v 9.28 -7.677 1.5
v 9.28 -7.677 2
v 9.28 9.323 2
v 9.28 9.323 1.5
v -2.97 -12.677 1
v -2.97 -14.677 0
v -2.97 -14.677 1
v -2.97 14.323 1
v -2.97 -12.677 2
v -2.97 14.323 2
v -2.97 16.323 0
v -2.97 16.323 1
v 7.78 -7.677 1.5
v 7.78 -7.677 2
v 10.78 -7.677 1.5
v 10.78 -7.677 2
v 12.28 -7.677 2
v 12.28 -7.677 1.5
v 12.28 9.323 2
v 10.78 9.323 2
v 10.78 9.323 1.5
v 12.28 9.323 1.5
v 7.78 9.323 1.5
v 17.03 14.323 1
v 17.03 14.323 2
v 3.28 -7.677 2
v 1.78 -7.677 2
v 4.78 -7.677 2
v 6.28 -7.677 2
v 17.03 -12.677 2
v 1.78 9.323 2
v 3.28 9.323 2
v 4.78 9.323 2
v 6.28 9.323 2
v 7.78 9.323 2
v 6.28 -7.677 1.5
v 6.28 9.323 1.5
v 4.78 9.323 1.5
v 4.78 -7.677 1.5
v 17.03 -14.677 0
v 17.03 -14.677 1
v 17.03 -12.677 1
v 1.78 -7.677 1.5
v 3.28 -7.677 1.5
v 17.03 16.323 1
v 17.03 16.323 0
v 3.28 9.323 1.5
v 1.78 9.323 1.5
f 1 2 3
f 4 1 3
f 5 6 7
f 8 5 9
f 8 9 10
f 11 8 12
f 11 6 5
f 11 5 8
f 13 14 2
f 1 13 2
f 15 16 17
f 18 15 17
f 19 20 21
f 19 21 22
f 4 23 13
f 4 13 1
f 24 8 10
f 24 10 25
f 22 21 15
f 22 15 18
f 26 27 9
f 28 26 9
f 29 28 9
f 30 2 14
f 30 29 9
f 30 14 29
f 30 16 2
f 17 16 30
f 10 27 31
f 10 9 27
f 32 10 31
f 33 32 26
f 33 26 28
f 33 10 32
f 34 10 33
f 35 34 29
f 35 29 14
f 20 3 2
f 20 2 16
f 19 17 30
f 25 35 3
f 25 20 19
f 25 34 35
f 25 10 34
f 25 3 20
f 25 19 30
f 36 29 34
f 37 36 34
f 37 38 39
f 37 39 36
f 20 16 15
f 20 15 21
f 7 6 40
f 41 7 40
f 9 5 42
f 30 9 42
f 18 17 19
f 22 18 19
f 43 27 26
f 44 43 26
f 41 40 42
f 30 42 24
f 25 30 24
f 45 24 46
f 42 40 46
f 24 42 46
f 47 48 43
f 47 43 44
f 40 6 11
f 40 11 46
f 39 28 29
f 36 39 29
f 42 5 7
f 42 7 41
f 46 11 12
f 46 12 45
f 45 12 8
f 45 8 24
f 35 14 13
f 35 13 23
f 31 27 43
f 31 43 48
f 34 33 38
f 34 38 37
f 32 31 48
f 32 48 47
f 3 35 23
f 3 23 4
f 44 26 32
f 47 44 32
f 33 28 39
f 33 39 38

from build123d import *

# Parameters (mm, degrees)
F0_W     = 20
F0_H     = 31
F1_DEPTH = 1
F2_W     = 20
F2_H     = 27
F3_DEPTH = 1
F4_W     = 1.5
F4_H     = 17
F5_DEPTH = 0.5


with BuildPart() as f1:
    # F0 (on Top) → F1 (new body)
    with BuildSketch(Plane.XY):
        with Locations((7.02957, 0.822581)):
            Rectangle(F0_W, F0_H)
    extrude(amount=F1_DEPTH)

    # F2 (on face) → F3 (join)
    with BuildSketch(Plane.XY.offset(1)):
        with Locations((7.02957, 0.822581)):
            Rectangle(F2_W, F2_H)
    extrude(amount=F3_DEPTH)

    # F4 (on face) → F5 (cut)
    with BuildSketch(Plane.XY.offset(2)):
        with Locations((2.52957, 0.822581)):
            Rectangle(F4_W, F4_H)
        with Locations((5.52957, 0.822581)):
            Rectangle(F4_W, F4_H)
        with Locations((8.52957, 0.822581)):
            Rectangle(F4_W, F4_H)
        with Locations((11.52957, 0.822581)):
            Rectangle(F4_W, F4_H)
    extrude(amount=-F5_DEPTH, mode=Mode.SUBTRACT)


solid = f1.part
